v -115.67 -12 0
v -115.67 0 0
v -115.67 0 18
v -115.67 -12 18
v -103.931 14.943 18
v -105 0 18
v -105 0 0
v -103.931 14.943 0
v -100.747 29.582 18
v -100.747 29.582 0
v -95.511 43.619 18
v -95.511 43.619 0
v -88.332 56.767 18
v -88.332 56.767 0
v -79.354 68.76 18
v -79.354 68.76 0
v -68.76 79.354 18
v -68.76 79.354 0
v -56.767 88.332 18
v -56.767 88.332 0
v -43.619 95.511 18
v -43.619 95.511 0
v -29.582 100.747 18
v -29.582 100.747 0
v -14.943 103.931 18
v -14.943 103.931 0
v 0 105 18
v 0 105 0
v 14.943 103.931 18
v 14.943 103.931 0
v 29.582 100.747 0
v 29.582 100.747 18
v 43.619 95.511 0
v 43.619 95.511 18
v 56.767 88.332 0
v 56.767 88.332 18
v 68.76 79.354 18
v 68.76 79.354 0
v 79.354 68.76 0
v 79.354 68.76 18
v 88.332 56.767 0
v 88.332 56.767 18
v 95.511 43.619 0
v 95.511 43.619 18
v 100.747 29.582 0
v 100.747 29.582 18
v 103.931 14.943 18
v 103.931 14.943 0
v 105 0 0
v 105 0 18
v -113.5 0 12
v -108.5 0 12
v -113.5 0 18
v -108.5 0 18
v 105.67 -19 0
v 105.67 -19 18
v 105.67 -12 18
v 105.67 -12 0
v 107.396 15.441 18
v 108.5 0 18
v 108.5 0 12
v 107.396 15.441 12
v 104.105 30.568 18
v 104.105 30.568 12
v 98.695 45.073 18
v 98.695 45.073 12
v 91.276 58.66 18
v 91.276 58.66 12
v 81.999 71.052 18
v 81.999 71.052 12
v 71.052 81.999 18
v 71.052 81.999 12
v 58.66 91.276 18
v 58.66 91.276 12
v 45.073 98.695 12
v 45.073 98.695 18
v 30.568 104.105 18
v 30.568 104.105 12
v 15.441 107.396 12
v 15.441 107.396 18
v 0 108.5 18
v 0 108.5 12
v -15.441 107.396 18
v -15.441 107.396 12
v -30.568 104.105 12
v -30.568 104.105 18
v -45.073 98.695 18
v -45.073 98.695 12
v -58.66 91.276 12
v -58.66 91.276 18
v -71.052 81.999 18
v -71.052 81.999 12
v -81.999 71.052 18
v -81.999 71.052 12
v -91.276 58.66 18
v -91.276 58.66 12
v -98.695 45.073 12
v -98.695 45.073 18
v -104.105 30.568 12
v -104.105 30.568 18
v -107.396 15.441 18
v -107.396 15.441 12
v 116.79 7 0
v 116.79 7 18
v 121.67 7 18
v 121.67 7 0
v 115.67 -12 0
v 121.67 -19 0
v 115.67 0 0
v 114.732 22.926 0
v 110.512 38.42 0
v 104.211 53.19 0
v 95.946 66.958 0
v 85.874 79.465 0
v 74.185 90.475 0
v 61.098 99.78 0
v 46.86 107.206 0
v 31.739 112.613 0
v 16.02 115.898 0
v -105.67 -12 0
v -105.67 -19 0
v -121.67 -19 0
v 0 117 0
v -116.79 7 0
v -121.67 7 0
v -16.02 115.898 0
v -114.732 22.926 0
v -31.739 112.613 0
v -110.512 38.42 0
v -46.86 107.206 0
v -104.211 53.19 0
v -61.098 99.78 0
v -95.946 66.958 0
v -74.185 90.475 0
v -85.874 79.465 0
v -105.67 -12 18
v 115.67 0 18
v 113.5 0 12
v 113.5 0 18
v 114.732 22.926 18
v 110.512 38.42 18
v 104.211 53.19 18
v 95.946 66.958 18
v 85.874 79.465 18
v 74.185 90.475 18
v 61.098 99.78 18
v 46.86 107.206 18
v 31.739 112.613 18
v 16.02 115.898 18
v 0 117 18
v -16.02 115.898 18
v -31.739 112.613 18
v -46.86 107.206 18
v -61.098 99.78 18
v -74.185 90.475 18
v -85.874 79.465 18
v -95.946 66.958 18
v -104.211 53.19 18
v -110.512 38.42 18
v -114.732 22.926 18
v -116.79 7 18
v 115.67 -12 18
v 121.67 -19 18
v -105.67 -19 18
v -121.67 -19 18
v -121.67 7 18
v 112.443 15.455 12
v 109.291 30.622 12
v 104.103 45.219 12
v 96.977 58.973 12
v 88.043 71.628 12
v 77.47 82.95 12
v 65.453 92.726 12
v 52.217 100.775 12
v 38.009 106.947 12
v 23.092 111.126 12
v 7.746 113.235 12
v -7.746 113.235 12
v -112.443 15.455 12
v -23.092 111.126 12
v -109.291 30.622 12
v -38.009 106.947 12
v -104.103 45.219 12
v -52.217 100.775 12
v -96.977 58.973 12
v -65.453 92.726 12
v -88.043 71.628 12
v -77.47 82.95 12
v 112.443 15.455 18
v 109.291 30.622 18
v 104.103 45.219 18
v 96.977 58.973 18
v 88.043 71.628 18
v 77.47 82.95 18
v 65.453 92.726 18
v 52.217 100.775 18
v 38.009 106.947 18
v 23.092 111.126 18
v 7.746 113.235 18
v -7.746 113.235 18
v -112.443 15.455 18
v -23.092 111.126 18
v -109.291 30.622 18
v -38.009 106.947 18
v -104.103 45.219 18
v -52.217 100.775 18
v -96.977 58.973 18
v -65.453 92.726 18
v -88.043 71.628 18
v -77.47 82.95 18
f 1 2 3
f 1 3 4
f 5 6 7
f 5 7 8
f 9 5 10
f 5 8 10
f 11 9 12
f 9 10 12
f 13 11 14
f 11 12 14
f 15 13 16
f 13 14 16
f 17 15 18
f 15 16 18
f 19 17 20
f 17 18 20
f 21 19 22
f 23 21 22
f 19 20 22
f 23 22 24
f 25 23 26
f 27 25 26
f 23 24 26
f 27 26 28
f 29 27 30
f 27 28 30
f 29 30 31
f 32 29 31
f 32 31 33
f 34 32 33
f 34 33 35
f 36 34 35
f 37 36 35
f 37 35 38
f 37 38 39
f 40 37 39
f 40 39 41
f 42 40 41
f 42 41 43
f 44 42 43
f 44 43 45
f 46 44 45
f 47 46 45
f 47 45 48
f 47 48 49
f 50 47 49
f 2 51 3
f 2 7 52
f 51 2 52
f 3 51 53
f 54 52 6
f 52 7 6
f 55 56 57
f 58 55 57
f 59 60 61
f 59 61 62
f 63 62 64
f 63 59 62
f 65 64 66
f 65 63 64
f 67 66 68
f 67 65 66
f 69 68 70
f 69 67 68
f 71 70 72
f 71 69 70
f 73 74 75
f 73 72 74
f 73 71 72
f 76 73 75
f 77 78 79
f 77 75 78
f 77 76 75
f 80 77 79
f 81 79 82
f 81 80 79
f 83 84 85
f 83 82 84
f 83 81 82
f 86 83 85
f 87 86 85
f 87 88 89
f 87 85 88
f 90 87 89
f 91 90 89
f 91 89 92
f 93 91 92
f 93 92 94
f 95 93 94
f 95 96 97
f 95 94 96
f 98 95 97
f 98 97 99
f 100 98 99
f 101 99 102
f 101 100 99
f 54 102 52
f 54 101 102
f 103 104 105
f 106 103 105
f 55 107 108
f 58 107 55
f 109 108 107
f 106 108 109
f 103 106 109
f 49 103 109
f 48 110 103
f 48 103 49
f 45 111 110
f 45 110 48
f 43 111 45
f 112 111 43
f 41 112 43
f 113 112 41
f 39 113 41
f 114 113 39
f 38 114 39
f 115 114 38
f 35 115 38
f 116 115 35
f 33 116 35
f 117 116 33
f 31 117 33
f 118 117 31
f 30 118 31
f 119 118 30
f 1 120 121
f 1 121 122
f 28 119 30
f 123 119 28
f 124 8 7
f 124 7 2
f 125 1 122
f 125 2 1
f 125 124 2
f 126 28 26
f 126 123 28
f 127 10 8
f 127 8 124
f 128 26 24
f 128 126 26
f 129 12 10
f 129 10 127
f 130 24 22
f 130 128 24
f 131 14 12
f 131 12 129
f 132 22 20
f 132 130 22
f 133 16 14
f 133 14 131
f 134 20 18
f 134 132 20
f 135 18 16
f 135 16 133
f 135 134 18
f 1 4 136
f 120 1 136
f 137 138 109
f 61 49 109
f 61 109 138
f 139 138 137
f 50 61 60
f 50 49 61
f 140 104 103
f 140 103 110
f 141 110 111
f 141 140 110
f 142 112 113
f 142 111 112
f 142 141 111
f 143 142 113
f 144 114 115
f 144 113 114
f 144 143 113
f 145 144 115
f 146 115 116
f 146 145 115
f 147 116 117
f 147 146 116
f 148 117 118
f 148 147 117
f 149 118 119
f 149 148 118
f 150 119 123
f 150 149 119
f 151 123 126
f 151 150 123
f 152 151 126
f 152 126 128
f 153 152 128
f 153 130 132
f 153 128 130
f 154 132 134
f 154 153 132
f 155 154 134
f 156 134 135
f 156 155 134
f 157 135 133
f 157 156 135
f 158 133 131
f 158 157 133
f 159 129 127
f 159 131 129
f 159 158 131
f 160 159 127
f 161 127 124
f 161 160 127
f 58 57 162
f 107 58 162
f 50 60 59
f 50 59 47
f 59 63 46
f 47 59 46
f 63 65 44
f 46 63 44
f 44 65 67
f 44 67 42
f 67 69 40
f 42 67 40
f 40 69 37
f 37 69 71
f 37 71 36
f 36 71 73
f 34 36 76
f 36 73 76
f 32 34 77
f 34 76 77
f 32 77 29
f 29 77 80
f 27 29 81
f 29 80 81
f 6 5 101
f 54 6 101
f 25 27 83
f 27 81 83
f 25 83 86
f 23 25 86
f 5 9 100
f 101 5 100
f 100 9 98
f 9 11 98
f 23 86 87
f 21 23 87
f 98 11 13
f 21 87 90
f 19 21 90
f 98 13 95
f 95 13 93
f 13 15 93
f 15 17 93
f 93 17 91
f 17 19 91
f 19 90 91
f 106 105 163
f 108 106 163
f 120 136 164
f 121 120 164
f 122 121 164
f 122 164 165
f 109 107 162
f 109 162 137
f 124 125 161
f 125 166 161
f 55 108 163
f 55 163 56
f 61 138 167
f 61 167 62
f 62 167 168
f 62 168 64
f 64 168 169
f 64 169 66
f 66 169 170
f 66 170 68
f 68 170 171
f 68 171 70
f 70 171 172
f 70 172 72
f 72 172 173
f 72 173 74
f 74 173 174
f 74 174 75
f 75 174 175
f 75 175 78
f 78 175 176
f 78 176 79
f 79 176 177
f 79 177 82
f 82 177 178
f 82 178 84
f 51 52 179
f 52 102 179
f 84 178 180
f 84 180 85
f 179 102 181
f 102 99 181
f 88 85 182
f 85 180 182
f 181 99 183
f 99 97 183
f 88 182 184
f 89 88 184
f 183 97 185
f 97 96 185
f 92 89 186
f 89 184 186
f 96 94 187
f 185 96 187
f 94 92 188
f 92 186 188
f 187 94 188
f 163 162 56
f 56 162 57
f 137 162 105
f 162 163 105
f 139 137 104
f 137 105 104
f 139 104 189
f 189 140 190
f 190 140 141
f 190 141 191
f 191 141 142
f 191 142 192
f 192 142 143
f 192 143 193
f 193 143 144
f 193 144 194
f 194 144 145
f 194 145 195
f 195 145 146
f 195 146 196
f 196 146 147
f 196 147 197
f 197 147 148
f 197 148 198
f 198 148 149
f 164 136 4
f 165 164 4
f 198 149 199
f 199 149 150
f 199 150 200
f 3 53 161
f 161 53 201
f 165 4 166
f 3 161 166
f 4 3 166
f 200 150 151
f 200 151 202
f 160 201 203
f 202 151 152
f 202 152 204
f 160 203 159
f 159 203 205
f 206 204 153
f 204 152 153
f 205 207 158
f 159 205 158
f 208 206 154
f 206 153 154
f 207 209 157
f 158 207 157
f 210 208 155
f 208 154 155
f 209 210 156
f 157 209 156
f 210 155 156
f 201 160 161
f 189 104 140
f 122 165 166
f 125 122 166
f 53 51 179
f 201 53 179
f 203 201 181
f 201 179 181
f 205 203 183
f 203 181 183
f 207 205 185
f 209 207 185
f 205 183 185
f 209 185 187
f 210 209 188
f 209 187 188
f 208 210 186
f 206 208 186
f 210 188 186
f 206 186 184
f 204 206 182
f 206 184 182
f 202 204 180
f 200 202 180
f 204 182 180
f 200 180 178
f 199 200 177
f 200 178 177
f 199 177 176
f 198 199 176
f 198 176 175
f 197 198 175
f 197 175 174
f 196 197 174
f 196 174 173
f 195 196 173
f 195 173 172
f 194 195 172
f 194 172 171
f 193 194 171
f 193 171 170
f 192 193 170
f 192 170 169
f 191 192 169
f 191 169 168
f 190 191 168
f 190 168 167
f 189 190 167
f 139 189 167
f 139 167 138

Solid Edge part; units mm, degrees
sketch "Sketch1" plane through (0, 0, 0) normal (0, -1, 0) x (1, 0, 0)
  line L0 (-117, 0) -> (-117, 18)
  line L1 (-117, 18) -> (-113.5, 18)
  line L2 (-113.5, 18) -> (-113.5, 12)
  line L3 (-113.5, 12) -> (-108.5, 12)
  line L4 (-108.5, 12) -> (-108.5, 18)
  line L5 (-108.5, 18) -> (-105, 18)
  line L6 (-105, 18) -> (-105, 0)
  line L7 (-105, 0) -> (-117, 0)
  dimension "D1" = 18
  dimension "D2" = 18
  dimension "D3" = 12
  dimension "D4" = 3.5
  dimension "D5" = 5
  dimension "D6" = 3.5
  dimension "D7" = 6
  dimension "D8" = 105
revolve "RevolvedProtrusion1" add sketch "Sketch1" angle 180 about axis through (0, 0, 54) along (0, 0, -1)
sketch "Sketch2" plane through (0, 58.5, 18) normal (0, 0, 1) x (1, 0, 0)
  line L0 (116.7904, -58.5) -> (116.7904, -51.5)
  line L1 (116.7904, -51.5) -> (121.6705, -51.5)
  line L2 (121.6705, -51.5) -> (121.6705, -77.5)
  line L3 (121.6705, -77.5) -> (105.6705, -77.5)
  line L4 (105.6705, -77.5) -> (105.6705, -70.5)
  line L5 (105.6705, -70.5) -> (115.6705, -70.5)
  line L6 (115.6705, -70.5) -> (115.6705, -58.5)
  line L7 (116.7904, -58.5) -> (115.6705, -58.5)
  dimension "D1" = 7
  dimension "D2" = 6
  dimension "D3" = 7
  dimension "D4" = 12
  dimension "D5" = 16
extrude "ExtrudedProtrusion_3" add sketch "Sketch2" against normal blind 18
mirror "Mirror1" about plane through (0, 0, 0) normal (1, 0, 0) of "ExtrudedProtrusion_3"
properties material "ABS Plastic, high impact"
